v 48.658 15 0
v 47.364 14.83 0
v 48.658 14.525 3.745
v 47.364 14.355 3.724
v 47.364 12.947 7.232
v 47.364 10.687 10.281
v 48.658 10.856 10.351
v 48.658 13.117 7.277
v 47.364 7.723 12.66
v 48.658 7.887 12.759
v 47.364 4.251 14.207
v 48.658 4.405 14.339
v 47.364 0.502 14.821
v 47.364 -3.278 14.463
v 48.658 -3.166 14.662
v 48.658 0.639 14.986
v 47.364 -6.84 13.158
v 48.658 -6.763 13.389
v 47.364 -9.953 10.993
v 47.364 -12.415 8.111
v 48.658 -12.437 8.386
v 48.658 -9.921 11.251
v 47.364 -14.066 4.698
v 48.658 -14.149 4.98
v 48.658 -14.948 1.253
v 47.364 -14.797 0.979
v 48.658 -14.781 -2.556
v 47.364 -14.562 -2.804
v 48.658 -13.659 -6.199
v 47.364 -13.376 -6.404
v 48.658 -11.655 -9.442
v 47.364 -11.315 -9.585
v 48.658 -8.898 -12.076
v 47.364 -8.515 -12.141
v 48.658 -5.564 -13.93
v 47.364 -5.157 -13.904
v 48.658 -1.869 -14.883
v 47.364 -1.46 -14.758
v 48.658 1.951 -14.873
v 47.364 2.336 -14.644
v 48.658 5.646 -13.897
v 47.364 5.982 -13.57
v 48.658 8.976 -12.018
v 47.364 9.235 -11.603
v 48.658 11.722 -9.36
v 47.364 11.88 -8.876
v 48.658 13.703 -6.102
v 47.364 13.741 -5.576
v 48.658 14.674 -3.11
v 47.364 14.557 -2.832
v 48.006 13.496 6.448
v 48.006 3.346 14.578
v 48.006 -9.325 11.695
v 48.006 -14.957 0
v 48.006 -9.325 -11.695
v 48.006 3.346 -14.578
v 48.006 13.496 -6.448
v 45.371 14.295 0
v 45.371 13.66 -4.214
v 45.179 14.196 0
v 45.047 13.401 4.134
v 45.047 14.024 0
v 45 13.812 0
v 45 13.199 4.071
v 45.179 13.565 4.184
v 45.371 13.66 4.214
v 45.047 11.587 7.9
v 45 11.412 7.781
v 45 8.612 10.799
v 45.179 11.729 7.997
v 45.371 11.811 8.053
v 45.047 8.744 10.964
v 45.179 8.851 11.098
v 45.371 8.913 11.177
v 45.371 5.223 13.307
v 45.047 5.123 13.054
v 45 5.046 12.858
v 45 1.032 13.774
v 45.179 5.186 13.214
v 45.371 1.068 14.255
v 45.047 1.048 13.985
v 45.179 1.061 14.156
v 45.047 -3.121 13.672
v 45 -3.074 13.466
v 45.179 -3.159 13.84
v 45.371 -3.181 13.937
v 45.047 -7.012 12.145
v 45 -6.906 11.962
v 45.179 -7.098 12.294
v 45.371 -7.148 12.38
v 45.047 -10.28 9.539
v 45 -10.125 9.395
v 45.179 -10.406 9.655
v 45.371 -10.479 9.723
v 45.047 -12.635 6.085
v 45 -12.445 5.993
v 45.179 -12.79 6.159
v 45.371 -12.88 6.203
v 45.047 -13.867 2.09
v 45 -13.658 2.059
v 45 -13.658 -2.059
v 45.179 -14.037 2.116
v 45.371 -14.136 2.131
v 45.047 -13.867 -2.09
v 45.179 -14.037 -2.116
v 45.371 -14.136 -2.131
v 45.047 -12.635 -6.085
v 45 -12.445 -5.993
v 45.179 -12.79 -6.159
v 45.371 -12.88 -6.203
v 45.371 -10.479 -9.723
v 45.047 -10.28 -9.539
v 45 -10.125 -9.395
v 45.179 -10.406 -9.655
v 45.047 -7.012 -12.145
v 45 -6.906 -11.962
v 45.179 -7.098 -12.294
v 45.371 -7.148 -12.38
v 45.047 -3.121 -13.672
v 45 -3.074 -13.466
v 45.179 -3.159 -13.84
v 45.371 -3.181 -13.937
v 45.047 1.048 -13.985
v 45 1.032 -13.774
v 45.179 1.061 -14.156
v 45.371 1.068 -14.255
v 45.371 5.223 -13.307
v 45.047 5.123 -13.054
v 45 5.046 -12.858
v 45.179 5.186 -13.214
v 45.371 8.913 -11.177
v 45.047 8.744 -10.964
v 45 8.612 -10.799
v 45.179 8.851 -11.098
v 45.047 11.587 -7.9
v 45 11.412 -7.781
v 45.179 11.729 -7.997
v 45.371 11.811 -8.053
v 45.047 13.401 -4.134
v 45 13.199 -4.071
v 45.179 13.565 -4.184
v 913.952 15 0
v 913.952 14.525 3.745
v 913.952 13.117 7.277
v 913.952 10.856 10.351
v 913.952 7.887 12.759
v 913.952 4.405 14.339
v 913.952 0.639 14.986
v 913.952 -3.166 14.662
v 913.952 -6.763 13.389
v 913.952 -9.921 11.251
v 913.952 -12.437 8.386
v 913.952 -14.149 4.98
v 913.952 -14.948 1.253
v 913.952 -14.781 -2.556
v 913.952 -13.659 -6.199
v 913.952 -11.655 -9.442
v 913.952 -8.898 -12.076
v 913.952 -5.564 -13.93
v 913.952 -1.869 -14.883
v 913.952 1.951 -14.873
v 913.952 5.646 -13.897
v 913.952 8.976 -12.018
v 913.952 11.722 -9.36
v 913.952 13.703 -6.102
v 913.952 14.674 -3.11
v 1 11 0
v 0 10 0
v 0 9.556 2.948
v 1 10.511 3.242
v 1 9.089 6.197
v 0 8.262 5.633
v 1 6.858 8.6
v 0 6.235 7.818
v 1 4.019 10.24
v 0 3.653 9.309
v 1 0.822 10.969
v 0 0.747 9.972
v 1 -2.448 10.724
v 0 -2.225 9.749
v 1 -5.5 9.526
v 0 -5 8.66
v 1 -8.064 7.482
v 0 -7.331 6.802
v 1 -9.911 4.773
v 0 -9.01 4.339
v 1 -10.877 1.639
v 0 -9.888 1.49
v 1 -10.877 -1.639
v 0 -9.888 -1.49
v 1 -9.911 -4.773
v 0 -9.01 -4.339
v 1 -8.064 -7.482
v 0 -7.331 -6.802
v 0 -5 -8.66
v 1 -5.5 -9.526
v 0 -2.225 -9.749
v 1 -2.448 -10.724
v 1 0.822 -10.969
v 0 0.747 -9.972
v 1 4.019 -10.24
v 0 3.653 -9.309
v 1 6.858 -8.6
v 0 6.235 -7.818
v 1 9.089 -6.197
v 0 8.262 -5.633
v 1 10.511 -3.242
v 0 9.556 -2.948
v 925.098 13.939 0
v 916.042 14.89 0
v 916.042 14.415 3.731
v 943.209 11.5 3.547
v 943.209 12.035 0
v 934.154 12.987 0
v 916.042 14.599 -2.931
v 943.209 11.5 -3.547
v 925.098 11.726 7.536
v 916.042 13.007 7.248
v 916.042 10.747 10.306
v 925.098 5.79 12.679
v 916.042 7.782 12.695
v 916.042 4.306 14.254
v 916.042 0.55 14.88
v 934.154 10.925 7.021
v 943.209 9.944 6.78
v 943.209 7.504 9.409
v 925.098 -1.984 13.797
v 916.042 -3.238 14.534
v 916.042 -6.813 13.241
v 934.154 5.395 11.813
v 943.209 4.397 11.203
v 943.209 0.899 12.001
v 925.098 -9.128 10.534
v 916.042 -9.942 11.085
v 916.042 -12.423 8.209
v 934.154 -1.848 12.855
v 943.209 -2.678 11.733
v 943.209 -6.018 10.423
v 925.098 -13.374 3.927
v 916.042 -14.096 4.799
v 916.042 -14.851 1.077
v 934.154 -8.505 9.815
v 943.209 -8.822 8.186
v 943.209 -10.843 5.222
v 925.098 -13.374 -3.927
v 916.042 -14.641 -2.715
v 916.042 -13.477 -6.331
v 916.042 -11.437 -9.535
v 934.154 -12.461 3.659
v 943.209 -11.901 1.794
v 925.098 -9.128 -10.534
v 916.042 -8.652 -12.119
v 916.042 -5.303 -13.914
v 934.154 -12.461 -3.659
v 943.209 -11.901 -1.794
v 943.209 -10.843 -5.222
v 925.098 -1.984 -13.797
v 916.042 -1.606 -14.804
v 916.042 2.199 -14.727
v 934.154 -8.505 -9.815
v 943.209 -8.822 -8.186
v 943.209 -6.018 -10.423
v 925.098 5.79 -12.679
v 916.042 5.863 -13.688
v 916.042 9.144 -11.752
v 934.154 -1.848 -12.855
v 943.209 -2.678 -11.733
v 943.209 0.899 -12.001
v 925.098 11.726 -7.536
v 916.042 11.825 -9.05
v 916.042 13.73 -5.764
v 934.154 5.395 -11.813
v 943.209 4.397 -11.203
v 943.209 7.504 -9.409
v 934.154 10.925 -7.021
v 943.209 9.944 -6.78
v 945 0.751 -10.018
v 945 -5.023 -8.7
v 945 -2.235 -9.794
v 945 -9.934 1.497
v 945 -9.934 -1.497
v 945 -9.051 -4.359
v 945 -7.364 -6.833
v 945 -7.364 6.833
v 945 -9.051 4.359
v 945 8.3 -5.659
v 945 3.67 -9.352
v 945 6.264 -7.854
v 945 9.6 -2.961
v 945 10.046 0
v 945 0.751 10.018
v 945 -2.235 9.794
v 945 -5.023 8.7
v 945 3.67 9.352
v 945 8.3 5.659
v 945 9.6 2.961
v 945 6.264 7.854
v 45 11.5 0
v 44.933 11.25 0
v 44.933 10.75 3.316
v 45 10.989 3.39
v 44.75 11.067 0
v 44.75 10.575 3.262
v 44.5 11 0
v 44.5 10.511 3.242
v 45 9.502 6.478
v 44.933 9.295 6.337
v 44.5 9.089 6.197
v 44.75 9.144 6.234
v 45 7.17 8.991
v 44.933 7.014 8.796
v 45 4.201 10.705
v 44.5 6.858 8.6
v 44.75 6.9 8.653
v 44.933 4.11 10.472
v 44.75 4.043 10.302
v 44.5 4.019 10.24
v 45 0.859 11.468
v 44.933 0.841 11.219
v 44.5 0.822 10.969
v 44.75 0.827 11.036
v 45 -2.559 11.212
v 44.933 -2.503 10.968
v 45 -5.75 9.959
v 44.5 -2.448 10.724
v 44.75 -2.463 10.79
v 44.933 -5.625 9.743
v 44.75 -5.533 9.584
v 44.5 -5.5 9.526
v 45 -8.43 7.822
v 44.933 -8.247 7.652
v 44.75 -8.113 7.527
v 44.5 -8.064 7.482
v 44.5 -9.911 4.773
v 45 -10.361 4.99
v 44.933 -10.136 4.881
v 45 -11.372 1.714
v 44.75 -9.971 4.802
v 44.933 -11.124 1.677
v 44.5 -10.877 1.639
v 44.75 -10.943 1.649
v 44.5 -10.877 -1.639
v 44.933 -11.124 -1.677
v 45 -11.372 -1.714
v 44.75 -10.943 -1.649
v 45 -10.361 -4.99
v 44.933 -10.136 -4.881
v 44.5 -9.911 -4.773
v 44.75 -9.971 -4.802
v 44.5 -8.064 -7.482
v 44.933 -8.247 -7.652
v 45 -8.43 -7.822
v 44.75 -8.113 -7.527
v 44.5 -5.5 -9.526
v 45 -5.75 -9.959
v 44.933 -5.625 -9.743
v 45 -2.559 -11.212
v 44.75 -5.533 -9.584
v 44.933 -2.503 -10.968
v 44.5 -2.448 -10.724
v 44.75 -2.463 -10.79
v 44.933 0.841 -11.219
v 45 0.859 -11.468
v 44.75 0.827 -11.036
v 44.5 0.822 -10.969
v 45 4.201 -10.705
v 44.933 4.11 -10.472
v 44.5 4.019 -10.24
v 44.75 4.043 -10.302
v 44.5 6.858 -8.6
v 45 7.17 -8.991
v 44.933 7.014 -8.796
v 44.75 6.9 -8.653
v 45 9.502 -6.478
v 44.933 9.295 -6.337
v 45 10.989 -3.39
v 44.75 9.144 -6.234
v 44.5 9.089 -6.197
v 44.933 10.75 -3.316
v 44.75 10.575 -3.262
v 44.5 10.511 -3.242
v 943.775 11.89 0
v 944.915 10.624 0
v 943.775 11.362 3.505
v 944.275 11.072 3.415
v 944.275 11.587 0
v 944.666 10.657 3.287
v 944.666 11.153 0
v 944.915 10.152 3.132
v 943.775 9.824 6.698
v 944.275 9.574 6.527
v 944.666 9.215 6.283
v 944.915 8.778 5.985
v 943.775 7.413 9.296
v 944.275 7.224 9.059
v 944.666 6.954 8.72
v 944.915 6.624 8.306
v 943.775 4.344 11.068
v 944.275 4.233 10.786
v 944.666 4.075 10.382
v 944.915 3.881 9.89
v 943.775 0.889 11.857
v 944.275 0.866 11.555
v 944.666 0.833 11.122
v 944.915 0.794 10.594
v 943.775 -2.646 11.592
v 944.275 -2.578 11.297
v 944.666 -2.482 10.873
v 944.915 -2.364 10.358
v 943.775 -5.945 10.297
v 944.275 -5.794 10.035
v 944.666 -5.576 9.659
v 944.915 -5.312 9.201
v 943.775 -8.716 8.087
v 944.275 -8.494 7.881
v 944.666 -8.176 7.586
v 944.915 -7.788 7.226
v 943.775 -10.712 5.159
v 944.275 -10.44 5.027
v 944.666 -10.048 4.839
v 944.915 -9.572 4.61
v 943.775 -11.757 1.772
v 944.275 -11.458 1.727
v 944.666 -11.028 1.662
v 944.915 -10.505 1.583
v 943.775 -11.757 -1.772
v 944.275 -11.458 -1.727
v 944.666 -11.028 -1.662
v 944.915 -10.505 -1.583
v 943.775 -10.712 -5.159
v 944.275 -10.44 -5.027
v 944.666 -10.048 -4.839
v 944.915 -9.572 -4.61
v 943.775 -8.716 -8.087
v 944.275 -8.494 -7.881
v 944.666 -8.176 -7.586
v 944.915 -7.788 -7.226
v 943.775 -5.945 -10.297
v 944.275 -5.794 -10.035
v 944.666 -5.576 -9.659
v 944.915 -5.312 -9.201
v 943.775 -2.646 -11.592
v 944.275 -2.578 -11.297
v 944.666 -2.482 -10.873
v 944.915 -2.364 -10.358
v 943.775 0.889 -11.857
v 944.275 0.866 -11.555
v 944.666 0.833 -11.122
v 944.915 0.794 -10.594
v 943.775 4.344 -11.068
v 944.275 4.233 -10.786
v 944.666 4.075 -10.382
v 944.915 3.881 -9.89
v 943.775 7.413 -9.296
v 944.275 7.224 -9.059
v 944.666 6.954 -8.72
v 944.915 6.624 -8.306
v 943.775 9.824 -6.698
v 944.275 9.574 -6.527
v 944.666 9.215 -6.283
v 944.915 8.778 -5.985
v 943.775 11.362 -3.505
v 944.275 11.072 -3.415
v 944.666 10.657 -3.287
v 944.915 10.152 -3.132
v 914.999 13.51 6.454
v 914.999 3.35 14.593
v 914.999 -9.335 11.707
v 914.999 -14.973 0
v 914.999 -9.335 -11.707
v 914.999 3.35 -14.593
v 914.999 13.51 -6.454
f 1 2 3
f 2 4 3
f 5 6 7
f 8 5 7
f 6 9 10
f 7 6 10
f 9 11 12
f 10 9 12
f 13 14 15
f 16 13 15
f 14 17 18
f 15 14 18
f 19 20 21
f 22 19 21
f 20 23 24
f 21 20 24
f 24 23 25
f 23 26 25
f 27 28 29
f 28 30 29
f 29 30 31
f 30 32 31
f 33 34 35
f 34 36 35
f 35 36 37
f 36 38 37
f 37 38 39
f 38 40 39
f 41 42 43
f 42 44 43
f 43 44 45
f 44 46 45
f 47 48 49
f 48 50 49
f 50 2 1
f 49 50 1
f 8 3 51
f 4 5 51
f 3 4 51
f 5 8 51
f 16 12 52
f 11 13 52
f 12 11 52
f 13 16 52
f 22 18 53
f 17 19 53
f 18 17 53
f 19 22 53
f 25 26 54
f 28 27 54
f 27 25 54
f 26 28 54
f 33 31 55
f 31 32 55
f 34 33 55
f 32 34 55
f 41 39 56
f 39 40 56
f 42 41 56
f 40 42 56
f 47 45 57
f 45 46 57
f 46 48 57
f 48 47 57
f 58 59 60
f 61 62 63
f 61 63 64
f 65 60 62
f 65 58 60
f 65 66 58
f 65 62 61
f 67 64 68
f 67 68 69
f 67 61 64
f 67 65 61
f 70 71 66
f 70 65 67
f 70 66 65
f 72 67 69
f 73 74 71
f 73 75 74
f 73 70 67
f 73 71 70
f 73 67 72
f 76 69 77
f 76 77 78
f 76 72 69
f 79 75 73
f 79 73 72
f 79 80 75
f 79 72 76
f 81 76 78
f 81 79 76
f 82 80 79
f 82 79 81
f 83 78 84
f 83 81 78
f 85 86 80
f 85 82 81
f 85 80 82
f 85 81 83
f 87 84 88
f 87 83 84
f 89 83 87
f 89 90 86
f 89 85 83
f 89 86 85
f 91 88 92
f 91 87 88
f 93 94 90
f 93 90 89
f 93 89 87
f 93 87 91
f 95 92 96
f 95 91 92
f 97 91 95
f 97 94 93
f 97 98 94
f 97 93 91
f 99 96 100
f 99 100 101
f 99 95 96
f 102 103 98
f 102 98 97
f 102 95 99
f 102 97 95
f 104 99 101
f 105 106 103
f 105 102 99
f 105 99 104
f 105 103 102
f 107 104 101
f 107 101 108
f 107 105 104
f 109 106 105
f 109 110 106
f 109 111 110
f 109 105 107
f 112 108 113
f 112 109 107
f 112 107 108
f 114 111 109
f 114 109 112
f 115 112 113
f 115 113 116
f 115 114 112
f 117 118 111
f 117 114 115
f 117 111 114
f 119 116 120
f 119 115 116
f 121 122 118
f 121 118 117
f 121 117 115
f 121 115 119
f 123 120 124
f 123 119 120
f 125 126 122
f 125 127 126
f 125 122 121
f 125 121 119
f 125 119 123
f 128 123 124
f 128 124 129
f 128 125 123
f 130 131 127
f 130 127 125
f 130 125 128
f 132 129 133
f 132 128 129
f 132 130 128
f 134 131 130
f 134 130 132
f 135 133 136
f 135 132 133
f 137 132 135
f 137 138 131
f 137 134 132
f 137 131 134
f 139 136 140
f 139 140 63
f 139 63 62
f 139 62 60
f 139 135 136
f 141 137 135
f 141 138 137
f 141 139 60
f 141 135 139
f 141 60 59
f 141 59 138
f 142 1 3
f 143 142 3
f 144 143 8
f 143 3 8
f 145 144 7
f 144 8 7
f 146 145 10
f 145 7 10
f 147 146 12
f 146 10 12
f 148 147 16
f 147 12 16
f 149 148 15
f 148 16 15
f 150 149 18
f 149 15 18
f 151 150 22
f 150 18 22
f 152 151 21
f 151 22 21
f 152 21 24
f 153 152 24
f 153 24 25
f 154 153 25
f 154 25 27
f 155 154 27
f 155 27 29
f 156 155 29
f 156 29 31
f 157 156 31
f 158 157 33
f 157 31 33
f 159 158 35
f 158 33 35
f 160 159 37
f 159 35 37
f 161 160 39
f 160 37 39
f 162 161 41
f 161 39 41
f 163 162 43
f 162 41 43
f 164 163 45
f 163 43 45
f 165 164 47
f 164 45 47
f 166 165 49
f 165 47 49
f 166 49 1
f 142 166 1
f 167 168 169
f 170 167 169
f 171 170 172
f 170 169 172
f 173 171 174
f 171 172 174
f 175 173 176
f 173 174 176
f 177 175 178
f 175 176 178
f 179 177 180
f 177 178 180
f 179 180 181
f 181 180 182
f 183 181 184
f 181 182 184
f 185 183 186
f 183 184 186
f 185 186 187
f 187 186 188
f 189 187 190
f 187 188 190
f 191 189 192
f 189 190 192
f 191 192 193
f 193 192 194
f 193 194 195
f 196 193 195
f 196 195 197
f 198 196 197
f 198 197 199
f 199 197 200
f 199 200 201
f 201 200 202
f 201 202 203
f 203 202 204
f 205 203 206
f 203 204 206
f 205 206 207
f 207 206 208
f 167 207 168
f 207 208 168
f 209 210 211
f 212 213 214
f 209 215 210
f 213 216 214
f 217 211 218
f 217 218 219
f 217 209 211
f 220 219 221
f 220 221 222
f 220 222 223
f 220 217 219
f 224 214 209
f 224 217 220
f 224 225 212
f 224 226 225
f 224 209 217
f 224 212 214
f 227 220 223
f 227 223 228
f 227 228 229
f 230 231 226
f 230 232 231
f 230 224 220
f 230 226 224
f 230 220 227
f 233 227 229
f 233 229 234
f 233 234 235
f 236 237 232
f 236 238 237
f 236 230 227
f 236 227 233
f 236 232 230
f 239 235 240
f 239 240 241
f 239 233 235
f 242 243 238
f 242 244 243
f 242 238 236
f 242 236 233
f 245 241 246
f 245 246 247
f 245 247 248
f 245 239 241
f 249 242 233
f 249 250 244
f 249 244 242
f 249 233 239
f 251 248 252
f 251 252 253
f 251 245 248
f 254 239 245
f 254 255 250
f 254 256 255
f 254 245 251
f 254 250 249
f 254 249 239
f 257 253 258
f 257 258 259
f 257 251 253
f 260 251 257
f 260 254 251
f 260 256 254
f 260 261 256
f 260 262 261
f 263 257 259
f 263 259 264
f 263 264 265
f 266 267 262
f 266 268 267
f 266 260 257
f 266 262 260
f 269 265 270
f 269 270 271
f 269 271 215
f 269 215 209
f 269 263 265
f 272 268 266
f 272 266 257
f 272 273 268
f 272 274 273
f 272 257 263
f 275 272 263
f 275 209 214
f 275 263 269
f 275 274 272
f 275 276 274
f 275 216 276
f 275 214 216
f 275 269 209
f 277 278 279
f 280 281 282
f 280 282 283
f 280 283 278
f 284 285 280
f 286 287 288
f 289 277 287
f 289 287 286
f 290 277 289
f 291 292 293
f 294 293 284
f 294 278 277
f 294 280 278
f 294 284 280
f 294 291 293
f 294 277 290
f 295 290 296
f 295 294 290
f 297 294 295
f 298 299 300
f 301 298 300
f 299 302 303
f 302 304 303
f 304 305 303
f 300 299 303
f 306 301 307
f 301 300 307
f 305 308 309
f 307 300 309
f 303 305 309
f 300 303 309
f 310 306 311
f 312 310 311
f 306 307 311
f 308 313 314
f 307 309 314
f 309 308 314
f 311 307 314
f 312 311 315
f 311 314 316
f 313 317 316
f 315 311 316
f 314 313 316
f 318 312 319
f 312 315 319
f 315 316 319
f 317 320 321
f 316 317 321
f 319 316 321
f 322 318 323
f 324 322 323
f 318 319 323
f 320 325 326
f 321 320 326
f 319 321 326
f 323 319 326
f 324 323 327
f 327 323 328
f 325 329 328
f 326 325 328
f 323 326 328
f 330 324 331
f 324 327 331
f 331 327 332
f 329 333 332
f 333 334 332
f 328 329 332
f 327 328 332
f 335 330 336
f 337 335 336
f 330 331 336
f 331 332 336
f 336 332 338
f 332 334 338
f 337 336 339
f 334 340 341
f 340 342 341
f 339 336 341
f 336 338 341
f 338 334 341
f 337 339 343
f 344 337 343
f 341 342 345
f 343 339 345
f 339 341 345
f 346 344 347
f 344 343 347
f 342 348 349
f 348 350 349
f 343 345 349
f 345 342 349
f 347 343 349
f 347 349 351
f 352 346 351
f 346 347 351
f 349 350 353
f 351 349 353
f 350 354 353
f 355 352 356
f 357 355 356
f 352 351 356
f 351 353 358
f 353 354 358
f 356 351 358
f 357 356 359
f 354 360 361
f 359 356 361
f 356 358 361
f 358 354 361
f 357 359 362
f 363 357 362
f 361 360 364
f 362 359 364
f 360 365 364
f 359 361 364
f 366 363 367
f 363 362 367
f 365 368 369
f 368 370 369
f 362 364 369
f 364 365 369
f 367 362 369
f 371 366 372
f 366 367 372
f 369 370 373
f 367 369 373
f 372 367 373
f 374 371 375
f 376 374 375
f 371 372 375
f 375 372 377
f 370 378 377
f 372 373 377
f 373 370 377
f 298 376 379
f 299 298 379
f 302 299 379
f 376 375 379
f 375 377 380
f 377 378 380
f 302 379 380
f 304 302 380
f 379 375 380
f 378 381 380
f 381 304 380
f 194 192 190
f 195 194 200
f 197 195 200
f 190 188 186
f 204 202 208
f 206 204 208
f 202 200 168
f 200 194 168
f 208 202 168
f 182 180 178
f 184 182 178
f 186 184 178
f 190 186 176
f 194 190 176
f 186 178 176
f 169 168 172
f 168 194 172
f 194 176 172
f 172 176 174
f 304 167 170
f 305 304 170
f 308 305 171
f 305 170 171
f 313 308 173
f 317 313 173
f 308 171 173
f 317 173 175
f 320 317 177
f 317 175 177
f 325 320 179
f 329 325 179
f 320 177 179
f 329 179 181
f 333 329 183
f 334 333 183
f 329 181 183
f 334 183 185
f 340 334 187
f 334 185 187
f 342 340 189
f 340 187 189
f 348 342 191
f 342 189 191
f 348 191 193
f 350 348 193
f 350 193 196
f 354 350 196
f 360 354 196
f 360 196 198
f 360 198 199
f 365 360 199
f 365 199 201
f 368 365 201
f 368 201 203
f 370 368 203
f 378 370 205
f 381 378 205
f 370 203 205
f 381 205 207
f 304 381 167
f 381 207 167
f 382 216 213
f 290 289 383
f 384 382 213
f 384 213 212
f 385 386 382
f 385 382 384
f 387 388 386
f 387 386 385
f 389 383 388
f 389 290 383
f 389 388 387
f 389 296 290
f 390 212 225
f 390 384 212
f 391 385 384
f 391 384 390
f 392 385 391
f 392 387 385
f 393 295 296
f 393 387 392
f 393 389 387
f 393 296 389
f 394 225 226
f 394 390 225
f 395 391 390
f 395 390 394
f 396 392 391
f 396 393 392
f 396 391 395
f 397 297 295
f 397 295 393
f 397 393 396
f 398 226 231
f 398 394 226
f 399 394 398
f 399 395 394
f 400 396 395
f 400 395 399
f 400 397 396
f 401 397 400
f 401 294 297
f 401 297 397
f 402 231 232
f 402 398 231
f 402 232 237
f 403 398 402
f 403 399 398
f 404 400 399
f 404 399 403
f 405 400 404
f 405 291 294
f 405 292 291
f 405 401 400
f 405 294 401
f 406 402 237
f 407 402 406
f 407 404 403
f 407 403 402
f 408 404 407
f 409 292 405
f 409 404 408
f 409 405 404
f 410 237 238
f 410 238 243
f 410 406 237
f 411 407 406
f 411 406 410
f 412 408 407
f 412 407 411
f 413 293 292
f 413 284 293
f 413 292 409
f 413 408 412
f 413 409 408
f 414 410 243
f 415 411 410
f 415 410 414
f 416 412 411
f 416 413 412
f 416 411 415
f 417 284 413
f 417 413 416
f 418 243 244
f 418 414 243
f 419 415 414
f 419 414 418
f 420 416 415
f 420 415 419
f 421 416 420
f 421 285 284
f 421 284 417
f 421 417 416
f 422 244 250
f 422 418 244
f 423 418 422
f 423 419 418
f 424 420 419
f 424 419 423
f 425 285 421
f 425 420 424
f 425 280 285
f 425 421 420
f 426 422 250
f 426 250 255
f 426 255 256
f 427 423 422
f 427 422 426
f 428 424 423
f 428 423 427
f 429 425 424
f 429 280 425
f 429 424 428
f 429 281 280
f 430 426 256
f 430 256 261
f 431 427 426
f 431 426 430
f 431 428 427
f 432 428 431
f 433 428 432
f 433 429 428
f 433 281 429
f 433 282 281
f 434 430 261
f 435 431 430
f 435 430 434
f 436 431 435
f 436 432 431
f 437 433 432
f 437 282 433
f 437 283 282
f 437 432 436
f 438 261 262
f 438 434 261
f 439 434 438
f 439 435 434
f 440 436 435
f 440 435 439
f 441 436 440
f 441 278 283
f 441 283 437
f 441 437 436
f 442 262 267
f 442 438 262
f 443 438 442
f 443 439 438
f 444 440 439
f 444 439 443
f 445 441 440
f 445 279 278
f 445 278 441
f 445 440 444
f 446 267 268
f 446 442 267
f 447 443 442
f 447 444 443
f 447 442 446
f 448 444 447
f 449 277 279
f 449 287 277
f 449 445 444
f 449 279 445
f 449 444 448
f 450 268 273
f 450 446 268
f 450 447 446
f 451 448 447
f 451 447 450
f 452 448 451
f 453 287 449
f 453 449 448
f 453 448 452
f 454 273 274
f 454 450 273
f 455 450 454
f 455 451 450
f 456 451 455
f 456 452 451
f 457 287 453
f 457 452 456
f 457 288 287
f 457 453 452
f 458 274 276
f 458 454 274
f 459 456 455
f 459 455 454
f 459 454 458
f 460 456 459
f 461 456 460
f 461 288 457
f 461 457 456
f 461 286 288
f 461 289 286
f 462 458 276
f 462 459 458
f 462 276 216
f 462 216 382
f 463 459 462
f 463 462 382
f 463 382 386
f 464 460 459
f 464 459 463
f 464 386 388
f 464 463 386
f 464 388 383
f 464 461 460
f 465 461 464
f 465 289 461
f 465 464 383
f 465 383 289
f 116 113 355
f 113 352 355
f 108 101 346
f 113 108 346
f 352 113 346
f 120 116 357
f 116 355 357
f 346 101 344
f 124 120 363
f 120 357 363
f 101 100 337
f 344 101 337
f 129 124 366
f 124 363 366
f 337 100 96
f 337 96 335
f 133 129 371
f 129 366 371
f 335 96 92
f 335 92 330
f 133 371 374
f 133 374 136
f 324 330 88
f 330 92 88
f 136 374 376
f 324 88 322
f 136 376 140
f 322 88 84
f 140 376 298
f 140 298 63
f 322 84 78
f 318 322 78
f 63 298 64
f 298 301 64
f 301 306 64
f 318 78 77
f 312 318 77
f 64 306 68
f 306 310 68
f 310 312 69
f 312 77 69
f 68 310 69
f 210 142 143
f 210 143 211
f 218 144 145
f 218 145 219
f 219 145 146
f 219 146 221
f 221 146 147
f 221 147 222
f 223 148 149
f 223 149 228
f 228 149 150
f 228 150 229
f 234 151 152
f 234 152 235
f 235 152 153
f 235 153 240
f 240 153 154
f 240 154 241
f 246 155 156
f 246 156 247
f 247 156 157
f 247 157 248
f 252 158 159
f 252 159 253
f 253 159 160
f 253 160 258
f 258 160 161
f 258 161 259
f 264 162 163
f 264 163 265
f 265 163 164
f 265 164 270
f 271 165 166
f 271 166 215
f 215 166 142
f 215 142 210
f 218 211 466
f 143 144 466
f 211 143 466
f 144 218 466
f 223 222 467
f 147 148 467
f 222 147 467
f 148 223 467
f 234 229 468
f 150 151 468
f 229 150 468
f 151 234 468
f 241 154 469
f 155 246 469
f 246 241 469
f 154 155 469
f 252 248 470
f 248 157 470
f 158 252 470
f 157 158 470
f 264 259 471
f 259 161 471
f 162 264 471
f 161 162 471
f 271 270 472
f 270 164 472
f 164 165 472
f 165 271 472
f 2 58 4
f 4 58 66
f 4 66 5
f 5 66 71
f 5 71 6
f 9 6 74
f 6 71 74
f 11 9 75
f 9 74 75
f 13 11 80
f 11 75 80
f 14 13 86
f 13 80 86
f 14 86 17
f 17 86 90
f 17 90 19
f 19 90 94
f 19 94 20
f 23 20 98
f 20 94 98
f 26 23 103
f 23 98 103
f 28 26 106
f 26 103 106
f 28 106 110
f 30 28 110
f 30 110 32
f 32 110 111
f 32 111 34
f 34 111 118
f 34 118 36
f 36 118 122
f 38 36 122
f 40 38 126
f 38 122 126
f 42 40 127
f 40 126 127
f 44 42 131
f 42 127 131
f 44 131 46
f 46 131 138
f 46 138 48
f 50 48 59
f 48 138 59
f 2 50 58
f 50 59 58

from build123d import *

# Parameters (mm, degrees)
F0_R     = 11
F1_DEPTH = 45
F2_R     = 15
F2_R_2   = 11
F3_DEPTH = 900
F4_SIZE2 = 3.153127058
F4_SIZE  = 30
F5_SIZE  = 1
F6_SIZE2 = 0.8038475773
F6_SIZE  = 3
F7_R     = 0.5
F8_R     = 5
F9_R     = 20
F10_R    = 2


with BuildPart() as f1:
    # F0 (on Right) → F1 (new body)
    with BuildSketch(Plane.YZ):
        Circle(F0_R)
    extrude(amount=F1_DEPTH)

    # F2 (on face) → F3 (join)
    with BuildSketch(Plane.YZ.offset(45)):
        Circle(F2_R)
        Circle(F2_R_2, mode=Mode.SUBTRACT)
        Circle(F2_R_2)
    extrude(amount=F3_DEPTH)

    # F4
    f4_edges = [f1.edges().sort_by_distance(p)[0] for p in [
        (945, -15, 0),
    ]]
    f4_side = f1.faces().sort_by_distance((495, -15, 0))[0]
    chamfer(f4_edges, length=F4_SIZE, length2=F4_SIZE2, reference=f4_side)

    # F5
    f5_edges = [f1.edges().sort_by_distance(p)[0] for p in [
        (0, -11, 0),
    ]]
    chamfer(f5_edges, length=F5_SIZE)

    # F6
    f6_edges = [f1.edges().sort_by_distance(p)[0] for p in [
        (45, -15, 0),
    ]]
    f6_side = f1.faces().sort_by_distance((480, -15, 0))[0]
    chamfer(f6_edges, length=F6_SIZE, length2=F6_SIZE2, reference=f6_side)

    # F7
    f7_edges = [f1.edges().sort_by_distance(p)[0] for p in [
        (45, -11, 0),
        (45, -14.196152, 0),
    ]]
    fillet(f7_edges, radius=F7_R)

    # F8
    f8_edges = [f1.edges().sort_by_distance(p)[0] for p in [
        (48, -15, 0),
    ]]
    fillet(f8_edges, radius=F8_R)

    # F9
    f9_edges = [f1.edges().sort_by_distance(p)[0] for p in [
        (915, -15, 0),
    ]]
    fillet(f9_edges, radius=F9_R)

    # F10
    f10_edges = [f1.edges().sort_by_distance(p)[0] for p in [
        (945, -11.846873, 0),
    ]]
    fillet(f10_edges, radius=F10_R)


solid = f1.part
